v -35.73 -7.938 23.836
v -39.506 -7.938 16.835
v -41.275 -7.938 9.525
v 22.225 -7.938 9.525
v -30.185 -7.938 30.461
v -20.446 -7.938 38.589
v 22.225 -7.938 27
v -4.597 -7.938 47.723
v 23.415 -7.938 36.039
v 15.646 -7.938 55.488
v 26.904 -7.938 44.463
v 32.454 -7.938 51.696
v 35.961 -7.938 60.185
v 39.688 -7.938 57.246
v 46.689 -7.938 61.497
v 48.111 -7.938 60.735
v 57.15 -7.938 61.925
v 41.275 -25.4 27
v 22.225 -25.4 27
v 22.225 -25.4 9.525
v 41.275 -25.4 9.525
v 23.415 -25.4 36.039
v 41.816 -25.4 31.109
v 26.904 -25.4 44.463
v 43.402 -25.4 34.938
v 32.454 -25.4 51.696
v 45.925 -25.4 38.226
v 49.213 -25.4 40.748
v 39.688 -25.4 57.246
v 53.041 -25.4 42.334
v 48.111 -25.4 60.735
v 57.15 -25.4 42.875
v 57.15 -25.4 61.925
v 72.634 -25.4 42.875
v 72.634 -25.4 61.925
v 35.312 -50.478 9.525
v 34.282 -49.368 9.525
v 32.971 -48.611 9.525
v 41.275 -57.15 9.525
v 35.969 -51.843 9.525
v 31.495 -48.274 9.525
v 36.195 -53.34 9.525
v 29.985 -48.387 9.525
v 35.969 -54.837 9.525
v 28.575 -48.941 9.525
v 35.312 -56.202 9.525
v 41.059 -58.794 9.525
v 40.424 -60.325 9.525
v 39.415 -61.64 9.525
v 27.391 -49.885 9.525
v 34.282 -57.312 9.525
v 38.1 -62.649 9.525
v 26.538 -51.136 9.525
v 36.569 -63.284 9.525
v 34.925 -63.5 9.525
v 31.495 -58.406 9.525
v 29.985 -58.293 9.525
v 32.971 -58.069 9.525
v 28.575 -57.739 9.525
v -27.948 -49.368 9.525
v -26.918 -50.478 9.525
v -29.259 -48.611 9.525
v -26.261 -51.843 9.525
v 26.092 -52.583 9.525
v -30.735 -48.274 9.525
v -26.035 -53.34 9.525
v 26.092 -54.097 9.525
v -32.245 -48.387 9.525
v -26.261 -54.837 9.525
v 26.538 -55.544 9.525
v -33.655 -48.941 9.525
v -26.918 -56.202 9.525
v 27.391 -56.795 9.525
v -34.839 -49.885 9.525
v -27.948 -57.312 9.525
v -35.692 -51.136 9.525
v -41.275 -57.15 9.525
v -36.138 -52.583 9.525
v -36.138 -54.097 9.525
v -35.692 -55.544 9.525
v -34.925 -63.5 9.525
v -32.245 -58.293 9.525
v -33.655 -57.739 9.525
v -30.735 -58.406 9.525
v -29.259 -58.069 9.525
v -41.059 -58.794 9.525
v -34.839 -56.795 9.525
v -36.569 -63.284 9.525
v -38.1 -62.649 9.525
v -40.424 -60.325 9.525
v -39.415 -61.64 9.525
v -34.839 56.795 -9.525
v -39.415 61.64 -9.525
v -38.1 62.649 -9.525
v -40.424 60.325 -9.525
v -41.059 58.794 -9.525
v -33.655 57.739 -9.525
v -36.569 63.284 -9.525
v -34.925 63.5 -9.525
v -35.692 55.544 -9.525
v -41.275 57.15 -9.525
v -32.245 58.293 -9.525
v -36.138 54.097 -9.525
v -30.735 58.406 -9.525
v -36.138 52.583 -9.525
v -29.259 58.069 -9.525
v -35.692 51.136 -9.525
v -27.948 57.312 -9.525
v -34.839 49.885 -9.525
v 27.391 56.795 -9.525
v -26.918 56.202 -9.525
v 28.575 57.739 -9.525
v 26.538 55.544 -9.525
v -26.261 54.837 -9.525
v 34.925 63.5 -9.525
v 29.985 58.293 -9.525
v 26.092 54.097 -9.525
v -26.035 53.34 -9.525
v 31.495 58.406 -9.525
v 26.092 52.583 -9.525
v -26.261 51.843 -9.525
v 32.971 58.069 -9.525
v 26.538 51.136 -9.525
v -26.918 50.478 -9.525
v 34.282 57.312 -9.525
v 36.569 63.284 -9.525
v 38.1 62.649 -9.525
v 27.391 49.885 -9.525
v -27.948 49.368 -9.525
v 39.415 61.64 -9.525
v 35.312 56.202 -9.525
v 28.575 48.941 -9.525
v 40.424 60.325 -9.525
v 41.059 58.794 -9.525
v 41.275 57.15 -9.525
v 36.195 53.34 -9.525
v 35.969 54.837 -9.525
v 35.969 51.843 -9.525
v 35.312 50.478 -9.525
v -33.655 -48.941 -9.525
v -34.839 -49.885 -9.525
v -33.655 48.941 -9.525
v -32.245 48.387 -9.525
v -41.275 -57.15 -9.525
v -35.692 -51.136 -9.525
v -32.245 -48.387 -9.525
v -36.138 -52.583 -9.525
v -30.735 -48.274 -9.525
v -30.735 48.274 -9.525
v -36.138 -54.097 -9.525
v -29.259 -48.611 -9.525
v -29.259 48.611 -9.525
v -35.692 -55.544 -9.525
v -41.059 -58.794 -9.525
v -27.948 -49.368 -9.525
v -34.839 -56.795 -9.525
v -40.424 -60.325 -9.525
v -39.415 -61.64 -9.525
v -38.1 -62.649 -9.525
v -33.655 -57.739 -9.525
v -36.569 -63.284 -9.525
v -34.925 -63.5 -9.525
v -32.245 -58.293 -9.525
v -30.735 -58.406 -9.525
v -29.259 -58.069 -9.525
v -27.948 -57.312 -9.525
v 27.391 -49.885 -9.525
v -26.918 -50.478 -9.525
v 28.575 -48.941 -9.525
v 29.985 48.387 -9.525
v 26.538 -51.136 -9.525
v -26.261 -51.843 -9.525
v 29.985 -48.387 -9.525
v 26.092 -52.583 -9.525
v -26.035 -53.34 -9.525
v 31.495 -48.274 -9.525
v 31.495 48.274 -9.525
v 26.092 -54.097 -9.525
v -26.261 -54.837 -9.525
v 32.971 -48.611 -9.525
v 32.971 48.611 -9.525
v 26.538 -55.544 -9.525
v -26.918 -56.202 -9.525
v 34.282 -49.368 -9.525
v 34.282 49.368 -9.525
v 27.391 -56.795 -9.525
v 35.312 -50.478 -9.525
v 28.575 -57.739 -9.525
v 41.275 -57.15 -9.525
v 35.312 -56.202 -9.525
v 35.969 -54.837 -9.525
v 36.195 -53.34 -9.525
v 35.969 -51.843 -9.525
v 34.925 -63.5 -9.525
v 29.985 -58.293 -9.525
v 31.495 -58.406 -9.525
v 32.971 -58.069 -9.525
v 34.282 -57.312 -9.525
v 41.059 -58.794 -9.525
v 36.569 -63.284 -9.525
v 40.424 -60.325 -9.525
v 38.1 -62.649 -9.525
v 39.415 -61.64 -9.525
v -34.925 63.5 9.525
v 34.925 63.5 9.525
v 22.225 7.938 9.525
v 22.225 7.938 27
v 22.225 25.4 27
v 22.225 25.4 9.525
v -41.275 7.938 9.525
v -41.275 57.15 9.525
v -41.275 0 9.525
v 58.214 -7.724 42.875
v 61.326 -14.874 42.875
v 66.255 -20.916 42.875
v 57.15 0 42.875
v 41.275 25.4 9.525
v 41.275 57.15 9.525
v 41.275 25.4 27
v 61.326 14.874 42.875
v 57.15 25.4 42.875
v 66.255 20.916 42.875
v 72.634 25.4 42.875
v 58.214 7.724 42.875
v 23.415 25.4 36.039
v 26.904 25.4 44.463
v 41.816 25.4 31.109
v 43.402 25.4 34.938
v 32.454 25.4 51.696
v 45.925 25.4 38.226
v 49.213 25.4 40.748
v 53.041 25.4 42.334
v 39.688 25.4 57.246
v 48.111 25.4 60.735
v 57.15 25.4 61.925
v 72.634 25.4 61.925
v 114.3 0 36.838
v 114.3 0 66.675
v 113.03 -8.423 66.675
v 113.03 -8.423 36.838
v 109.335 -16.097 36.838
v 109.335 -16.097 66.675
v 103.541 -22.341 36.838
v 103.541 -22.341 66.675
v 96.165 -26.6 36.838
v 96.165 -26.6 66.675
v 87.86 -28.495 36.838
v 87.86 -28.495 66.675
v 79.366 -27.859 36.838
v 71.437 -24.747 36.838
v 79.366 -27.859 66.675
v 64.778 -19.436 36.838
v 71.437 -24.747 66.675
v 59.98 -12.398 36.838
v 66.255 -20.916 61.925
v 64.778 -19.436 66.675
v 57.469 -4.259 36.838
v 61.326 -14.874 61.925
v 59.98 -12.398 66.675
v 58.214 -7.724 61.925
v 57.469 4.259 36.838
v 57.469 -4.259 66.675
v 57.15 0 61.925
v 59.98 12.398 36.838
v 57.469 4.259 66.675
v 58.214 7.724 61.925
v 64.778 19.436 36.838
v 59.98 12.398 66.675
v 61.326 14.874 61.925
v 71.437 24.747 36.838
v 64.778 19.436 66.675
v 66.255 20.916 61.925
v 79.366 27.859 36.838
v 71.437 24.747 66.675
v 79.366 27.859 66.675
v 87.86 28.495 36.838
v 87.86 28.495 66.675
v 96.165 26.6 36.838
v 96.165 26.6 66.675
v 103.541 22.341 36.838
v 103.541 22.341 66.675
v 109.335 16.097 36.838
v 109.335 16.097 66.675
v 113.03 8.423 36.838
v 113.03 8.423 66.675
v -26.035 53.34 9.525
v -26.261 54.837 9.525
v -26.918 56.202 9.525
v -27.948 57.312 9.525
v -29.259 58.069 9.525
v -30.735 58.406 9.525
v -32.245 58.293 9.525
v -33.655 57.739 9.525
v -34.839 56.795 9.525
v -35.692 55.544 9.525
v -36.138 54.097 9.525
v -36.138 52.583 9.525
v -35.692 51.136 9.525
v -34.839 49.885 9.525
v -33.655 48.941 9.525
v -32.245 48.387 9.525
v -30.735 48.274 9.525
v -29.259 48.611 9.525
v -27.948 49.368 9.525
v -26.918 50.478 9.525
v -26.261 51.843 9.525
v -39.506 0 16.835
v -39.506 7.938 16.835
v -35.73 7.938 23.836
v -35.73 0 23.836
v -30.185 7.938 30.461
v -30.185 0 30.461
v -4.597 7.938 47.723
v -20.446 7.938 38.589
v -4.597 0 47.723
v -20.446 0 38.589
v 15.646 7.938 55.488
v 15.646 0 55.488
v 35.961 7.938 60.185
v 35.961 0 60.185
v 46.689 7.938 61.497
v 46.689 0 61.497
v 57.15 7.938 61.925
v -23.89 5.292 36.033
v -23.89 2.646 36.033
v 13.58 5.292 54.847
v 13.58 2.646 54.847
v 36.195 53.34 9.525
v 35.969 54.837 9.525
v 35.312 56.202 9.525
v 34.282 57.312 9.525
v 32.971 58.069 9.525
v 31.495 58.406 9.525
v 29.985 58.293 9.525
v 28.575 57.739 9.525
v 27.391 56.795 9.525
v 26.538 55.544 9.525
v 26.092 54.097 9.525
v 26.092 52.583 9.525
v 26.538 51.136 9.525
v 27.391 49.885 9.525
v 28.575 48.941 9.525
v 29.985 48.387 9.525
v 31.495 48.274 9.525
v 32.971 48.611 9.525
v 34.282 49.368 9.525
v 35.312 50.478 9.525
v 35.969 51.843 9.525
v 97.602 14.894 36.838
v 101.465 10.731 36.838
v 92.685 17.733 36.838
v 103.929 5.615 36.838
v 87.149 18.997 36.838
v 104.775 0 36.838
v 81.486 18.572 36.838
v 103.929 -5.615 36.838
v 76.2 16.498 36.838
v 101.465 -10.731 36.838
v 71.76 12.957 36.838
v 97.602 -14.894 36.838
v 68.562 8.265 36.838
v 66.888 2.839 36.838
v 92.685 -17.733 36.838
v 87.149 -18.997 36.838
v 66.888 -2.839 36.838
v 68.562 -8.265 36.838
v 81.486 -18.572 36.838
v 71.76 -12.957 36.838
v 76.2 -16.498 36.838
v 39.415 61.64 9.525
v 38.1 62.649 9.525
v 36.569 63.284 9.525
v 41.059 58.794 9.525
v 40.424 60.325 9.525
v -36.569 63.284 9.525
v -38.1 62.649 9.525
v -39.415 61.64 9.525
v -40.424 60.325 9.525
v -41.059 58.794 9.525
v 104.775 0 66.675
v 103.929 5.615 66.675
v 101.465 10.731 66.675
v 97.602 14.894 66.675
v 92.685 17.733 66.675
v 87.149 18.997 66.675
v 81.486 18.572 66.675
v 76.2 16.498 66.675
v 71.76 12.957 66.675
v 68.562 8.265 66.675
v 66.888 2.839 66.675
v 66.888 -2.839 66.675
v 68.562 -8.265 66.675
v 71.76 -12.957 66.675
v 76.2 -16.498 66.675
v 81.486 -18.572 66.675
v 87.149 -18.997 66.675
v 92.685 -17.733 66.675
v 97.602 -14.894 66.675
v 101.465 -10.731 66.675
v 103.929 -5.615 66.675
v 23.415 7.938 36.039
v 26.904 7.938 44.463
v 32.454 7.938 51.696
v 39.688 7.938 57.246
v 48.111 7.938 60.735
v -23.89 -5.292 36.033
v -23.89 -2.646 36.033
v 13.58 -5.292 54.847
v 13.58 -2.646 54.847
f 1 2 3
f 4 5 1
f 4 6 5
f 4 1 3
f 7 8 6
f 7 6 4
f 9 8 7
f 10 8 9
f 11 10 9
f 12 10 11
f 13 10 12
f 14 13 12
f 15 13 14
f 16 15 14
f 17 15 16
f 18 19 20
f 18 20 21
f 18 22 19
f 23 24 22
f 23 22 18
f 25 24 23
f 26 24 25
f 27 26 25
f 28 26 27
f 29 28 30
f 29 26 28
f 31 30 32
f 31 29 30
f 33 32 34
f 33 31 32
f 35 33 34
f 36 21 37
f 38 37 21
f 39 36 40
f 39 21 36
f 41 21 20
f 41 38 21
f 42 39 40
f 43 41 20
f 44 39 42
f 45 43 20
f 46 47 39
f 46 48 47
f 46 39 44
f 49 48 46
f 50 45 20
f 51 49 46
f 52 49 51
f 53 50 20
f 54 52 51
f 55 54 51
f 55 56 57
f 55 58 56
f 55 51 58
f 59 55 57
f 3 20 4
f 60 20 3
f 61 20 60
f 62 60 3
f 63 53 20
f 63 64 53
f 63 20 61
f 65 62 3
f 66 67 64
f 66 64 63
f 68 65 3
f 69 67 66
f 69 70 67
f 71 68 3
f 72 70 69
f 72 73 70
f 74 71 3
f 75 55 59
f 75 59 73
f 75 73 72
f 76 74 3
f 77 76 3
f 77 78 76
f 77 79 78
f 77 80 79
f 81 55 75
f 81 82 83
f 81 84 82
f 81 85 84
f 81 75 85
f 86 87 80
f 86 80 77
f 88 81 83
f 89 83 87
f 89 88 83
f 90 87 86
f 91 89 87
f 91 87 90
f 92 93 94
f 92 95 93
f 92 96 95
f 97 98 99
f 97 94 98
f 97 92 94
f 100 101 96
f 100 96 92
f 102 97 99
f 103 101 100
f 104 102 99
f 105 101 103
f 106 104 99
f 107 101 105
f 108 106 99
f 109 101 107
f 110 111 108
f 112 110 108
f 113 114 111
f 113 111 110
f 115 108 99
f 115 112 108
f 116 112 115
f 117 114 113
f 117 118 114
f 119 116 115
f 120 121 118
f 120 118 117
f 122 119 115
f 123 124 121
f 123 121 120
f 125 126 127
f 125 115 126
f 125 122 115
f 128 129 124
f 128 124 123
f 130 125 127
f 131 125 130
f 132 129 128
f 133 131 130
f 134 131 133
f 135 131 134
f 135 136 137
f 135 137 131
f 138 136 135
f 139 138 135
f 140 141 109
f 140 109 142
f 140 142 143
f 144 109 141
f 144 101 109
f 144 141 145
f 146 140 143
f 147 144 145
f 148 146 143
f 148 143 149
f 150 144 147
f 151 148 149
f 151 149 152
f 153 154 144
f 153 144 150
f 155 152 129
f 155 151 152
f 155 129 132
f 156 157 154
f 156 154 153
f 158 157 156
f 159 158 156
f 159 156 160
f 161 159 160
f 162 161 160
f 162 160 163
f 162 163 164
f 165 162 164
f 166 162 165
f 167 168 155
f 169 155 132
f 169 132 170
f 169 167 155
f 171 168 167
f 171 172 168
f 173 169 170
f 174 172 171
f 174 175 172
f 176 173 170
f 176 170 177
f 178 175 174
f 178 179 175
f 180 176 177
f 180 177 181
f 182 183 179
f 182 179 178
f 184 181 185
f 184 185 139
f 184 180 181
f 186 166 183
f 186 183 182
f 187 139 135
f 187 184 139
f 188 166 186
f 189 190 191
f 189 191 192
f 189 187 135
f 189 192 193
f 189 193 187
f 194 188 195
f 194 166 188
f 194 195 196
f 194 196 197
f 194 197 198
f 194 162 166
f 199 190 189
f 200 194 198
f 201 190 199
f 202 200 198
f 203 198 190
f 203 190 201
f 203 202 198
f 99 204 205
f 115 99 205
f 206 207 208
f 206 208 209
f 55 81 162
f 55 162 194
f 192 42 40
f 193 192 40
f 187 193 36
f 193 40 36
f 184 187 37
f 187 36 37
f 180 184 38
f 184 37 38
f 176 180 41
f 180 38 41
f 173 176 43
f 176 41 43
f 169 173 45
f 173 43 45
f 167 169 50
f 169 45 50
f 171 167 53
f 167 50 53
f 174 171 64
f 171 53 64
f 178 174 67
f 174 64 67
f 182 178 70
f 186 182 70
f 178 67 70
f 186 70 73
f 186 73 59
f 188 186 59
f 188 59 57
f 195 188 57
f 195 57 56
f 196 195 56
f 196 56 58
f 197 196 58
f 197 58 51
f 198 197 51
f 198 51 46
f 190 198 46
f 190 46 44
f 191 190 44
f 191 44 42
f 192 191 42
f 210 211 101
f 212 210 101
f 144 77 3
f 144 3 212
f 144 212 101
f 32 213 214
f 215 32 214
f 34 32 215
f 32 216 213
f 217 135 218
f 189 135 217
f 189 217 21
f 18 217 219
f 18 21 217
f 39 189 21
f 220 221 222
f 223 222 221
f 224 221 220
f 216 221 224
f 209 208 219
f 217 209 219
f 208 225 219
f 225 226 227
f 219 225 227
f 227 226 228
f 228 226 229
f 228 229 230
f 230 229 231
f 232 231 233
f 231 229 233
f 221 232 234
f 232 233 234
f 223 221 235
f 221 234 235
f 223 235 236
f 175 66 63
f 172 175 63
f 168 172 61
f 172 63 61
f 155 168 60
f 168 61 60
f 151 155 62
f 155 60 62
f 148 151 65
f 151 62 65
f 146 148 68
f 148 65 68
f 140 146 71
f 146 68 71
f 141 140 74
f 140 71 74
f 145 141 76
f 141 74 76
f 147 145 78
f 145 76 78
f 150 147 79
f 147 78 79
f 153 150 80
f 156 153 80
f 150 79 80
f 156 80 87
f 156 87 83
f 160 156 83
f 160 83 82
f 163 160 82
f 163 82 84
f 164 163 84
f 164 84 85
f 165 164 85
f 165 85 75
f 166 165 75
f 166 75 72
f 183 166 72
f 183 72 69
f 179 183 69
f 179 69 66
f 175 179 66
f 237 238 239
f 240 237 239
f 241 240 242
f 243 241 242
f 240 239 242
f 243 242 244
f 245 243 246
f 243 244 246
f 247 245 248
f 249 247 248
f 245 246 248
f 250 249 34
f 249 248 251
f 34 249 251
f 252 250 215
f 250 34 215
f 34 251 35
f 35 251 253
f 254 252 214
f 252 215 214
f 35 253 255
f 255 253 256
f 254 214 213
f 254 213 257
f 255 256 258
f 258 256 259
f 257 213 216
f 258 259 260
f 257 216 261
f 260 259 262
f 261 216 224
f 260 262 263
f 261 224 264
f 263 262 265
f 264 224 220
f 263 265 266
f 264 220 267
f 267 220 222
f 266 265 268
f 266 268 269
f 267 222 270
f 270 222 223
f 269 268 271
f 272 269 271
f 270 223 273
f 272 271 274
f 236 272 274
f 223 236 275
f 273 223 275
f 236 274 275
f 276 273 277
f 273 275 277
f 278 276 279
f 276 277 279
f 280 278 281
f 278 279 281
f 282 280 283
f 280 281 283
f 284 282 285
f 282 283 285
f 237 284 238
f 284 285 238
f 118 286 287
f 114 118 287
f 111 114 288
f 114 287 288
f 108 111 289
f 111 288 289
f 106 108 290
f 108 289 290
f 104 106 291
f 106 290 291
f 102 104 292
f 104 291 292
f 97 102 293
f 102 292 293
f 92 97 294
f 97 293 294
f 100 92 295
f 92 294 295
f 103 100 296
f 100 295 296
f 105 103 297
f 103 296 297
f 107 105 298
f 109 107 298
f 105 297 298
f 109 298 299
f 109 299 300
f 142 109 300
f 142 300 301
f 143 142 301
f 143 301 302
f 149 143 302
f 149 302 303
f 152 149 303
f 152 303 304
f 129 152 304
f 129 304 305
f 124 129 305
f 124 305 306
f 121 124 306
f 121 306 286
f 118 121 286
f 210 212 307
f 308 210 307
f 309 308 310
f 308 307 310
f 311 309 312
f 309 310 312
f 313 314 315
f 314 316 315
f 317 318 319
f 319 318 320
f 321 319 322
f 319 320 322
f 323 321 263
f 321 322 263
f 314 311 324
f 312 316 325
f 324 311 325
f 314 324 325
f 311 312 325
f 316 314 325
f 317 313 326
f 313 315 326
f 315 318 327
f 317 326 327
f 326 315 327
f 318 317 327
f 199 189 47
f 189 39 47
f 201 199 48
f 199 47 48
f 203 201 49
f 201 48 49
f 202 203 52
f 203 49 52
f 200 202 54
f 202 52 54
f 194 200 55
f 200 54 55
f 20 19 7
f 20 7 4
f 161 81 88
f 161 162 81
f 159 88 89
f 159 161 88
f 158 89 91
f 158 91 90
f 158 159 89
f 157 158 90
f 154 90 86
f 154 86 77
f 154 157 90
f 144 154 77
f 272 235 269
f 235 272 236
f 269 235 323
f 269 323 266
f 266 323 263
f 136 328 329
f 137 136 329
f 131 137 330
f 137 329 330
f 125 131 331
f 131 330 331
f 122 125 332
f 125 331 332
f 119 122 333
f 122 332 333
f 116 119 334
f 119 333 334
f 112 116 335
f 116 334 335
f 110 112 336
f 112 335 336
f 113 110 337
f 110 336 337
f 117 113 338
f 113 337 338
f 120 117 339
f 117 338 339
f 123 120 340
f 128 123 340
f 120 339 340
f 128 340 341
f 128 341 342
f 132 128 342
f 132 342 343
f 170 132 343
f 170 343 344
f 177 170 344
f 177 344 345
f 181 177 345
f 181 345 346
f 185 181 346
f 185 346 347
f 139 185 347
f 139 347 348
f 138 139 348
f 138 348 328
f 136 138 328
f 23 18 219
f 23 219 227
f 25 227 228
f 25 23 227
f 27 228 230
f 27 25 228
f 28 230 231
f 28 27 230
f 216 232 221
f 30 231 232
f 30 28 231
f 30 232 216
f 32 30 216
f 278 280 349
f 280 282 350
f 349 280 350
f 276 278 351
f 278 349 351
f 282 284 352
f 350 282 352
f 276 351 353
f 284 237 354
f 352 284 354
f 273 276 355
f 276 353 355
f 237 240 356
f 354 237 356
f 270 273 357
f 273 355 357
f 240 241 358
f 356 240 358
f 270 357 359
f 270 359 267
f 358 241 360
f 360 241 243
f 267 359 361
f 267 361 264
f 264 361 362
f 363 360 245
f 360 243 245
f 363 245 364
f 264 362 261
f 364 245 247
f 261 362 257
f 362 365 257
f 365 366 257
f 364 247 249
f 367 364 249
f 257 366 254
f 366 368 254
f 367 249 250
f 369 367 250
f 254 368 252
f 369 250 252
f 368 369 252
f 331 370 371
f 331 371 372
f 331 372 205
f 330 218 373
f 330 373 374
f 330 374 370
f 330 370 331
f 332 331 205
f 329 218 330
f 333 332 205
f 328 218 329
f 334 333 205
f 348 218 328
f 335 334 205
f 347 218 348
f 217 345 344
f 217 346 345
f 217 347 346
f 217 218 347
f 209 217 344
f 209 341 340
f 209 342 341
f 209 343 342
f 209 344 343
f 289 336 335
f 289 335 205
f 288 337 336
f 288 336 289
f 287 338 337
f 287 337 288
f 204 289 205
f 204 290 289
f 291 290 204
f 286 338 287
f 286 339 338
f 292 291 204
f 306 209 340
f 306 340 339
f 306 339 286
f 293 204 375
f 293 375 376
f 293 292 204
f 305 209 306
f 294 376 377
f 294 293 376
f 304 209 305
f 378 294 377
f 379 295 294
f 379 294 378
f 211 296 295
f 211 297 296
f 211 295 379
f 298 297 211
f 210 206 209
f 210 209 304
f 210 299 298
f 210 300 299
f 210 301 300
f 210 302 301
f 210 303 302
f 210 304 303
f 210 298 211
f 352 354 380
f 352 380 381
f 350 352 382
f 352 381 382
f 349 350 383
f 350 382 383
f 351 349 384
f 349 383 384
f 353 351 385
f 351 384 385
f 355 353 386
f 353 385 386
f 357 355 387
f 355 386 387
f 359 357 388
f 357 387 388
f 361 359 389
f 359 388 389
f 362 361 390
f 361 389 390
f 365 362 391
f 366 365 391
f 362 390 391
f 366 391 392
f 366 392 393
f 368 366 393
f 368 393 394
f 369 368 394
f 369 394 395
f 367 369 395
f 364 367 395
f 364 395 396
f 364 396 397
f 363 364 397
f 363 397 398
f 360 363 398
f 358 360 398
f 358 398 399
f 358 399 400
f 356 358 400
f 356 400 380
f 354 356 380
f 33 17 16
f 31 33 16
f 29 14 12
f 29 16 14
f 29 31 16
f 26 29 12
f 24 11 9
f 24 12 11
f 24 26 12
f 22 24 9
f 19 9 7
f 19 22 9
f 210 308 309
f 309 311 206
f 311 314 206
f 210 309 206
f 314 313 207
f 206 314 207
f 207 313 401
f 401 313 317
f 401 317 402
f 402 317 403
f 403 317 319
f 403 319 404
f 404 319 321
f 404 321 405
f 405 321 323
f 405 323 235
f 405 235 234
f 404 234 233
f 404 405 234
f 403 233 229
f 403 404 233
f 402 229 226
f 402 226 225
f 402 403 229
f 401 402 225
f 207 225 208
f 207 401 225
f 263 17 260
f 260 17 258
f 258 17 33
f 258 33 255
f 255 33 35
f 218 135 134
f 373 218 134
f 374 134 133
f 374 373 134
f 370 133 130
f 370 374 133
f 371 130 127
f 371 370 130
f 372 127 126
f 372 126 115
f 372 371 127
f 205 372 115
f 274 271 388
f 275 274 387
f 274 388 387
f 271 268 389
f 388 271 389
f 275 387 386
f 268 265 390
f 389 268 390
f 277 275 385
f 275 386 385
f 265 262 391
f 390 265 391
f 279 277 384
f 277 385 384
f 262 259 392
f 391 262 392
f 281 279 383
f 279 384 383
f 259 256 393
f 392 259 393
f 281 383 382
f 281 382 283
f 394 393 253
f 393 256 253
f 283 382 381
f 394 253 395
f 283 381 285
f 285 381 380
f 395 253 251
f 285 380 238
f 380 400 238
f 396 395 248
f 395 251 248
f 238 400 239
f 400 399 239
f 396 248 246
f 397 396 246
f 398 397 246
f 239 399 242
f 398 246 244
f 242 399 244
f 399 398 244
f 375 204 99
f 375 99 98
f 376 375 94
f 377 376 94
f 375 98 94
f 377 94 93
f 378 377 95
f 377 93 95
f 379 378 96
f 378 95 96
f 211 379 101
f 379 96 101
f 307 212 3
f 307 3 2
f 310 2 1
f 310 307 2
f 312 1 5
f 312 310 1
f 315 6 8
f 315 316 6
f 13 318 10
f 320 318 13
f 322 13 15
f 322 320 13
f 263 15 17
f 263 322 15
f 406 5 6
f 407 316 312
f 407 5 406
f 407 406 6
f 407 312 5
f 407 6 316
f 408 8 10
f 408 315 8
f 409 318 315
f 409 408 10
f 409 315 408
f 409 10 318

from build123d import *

# Parameters (mm, degrees)
F1_DEPTH = 63.5
F0_W     = 28.575
F0_H     = 19.05
F2_DEPTH = 25.4
F3_DEPTH = 7.9375
F5_R     = 6.35
F6_R     = 5.08
F7_DEPTH = 25.4
F8_R     = 19.05
F9_DEPTH = 36.83


with BuildPart() as f1:
    # F0 (on Front) → F1 (new body, symmetric)
    with BuildSketch(Plane.XZ):
        Polygon((41.275, -9.525), (41.275, 9.525), (22.225, 9.525), (-41.275, 9.525), (-41.275, -9.525), align=None)
    extrude(amount=F1_DEPTH, both=True)

    # F0 (on Front) → F2 (join, symmetric)
    with BuildSketch(Plane.XZ):
        with BuildLine():
            Line((22.225, 9.525), (41.275, 9.525))
            Line((41.275, 9.525), (41.275, 27.0002))
            ThreePointArc((41.275, 27.0002), (45.92468, 38.22552), (57.15, 42.8752))
            Line((57.15, 42.8752), (57.15, 61.9252))
            ThreePointArc((57.15, 61.9252), (32.454296, 51.695904), (22.225, 27.0002))
            Line((22.225, 27.0002), (22.225, 9.525))
        make_face()
        with Locations((71.4375, 52.4002)):
            Rectangle(F0_W, F0_H)
    extrude(amount=F2_DEPTH, both=True)

    # F0 (on Front) → F3 (join, symmetric)
    with BuildSketch(Plane.XZ):
        with BuildLine():
            Line((-41.275, 9.525), (22.225, 9.525))
            Line((22.225, 9.525), (22.225, 27.0002))
            ThreePointArc((22.225, 27.0002), (32.454296, 51.695904), (57.15, 61.9252))
            add(Edge.make_bspline(
                [(-41.275, 9.525), (-38.595248, 38.531583), (15.192084, 62.063541), (57.15, 61.9252)],
                knots=[0, 0, 0, 0, 111.504536, 111.504536, 111.504536, 111.504536], degree=3))
        make_face()
    extrude(amount=F3_DEPTH, both=True)

    # F0 (on Front) → F4 (revolve)
    with BuildSketch(Plane.XZ):
        Polygon((85.725, 61.9252), (85.725, 42.8752), (85.725, 36.837653), (114.3, 36.837653), (114.3, 66.675), (85.725, 66.675), align=None)
    revolve(axis=Axis((85.725, 0, 52.4002), (0, 0, -1)))

    # F5
    f5_edges = [f1.edges().sort_by_distance(p)[0] for p in [
        (-41.275, -63.5, 0),
        (41.275, -63.5, 0),
        (-41.275, 63.5, 0),
        (41.275, 63.5, 0),
    ]]
    fillet(f5_edges, radius=F5_R)

    # F6 (on face) → F7 (cut)
    with BuildSketch(Plane.XY.offset(9.525)):
        with Locations((-31.115, 53.34)):
            Circle(F6_R)
        with Locations((31.115, 53.34)):
            Circle(F6_R)
        with Locations((-31.115, -53.34)):
            Circle(F6_R)
        with Locations((31.115, -53.34)):
            Circle(F6_R)
    extrude(amount=-F7_DEPTH, mode=Mode.SUBTRACT)

    # F8 (on face) → F9 (cut)
    with BuildSketch(Plane.XY.offset(66.675)):
        with Locations((85.725, 0)):
            Circle(F8_R)
    extrude(amount=-F9_DEPTH, mode=Mode.SUBTRACT)


solid = f1.part
